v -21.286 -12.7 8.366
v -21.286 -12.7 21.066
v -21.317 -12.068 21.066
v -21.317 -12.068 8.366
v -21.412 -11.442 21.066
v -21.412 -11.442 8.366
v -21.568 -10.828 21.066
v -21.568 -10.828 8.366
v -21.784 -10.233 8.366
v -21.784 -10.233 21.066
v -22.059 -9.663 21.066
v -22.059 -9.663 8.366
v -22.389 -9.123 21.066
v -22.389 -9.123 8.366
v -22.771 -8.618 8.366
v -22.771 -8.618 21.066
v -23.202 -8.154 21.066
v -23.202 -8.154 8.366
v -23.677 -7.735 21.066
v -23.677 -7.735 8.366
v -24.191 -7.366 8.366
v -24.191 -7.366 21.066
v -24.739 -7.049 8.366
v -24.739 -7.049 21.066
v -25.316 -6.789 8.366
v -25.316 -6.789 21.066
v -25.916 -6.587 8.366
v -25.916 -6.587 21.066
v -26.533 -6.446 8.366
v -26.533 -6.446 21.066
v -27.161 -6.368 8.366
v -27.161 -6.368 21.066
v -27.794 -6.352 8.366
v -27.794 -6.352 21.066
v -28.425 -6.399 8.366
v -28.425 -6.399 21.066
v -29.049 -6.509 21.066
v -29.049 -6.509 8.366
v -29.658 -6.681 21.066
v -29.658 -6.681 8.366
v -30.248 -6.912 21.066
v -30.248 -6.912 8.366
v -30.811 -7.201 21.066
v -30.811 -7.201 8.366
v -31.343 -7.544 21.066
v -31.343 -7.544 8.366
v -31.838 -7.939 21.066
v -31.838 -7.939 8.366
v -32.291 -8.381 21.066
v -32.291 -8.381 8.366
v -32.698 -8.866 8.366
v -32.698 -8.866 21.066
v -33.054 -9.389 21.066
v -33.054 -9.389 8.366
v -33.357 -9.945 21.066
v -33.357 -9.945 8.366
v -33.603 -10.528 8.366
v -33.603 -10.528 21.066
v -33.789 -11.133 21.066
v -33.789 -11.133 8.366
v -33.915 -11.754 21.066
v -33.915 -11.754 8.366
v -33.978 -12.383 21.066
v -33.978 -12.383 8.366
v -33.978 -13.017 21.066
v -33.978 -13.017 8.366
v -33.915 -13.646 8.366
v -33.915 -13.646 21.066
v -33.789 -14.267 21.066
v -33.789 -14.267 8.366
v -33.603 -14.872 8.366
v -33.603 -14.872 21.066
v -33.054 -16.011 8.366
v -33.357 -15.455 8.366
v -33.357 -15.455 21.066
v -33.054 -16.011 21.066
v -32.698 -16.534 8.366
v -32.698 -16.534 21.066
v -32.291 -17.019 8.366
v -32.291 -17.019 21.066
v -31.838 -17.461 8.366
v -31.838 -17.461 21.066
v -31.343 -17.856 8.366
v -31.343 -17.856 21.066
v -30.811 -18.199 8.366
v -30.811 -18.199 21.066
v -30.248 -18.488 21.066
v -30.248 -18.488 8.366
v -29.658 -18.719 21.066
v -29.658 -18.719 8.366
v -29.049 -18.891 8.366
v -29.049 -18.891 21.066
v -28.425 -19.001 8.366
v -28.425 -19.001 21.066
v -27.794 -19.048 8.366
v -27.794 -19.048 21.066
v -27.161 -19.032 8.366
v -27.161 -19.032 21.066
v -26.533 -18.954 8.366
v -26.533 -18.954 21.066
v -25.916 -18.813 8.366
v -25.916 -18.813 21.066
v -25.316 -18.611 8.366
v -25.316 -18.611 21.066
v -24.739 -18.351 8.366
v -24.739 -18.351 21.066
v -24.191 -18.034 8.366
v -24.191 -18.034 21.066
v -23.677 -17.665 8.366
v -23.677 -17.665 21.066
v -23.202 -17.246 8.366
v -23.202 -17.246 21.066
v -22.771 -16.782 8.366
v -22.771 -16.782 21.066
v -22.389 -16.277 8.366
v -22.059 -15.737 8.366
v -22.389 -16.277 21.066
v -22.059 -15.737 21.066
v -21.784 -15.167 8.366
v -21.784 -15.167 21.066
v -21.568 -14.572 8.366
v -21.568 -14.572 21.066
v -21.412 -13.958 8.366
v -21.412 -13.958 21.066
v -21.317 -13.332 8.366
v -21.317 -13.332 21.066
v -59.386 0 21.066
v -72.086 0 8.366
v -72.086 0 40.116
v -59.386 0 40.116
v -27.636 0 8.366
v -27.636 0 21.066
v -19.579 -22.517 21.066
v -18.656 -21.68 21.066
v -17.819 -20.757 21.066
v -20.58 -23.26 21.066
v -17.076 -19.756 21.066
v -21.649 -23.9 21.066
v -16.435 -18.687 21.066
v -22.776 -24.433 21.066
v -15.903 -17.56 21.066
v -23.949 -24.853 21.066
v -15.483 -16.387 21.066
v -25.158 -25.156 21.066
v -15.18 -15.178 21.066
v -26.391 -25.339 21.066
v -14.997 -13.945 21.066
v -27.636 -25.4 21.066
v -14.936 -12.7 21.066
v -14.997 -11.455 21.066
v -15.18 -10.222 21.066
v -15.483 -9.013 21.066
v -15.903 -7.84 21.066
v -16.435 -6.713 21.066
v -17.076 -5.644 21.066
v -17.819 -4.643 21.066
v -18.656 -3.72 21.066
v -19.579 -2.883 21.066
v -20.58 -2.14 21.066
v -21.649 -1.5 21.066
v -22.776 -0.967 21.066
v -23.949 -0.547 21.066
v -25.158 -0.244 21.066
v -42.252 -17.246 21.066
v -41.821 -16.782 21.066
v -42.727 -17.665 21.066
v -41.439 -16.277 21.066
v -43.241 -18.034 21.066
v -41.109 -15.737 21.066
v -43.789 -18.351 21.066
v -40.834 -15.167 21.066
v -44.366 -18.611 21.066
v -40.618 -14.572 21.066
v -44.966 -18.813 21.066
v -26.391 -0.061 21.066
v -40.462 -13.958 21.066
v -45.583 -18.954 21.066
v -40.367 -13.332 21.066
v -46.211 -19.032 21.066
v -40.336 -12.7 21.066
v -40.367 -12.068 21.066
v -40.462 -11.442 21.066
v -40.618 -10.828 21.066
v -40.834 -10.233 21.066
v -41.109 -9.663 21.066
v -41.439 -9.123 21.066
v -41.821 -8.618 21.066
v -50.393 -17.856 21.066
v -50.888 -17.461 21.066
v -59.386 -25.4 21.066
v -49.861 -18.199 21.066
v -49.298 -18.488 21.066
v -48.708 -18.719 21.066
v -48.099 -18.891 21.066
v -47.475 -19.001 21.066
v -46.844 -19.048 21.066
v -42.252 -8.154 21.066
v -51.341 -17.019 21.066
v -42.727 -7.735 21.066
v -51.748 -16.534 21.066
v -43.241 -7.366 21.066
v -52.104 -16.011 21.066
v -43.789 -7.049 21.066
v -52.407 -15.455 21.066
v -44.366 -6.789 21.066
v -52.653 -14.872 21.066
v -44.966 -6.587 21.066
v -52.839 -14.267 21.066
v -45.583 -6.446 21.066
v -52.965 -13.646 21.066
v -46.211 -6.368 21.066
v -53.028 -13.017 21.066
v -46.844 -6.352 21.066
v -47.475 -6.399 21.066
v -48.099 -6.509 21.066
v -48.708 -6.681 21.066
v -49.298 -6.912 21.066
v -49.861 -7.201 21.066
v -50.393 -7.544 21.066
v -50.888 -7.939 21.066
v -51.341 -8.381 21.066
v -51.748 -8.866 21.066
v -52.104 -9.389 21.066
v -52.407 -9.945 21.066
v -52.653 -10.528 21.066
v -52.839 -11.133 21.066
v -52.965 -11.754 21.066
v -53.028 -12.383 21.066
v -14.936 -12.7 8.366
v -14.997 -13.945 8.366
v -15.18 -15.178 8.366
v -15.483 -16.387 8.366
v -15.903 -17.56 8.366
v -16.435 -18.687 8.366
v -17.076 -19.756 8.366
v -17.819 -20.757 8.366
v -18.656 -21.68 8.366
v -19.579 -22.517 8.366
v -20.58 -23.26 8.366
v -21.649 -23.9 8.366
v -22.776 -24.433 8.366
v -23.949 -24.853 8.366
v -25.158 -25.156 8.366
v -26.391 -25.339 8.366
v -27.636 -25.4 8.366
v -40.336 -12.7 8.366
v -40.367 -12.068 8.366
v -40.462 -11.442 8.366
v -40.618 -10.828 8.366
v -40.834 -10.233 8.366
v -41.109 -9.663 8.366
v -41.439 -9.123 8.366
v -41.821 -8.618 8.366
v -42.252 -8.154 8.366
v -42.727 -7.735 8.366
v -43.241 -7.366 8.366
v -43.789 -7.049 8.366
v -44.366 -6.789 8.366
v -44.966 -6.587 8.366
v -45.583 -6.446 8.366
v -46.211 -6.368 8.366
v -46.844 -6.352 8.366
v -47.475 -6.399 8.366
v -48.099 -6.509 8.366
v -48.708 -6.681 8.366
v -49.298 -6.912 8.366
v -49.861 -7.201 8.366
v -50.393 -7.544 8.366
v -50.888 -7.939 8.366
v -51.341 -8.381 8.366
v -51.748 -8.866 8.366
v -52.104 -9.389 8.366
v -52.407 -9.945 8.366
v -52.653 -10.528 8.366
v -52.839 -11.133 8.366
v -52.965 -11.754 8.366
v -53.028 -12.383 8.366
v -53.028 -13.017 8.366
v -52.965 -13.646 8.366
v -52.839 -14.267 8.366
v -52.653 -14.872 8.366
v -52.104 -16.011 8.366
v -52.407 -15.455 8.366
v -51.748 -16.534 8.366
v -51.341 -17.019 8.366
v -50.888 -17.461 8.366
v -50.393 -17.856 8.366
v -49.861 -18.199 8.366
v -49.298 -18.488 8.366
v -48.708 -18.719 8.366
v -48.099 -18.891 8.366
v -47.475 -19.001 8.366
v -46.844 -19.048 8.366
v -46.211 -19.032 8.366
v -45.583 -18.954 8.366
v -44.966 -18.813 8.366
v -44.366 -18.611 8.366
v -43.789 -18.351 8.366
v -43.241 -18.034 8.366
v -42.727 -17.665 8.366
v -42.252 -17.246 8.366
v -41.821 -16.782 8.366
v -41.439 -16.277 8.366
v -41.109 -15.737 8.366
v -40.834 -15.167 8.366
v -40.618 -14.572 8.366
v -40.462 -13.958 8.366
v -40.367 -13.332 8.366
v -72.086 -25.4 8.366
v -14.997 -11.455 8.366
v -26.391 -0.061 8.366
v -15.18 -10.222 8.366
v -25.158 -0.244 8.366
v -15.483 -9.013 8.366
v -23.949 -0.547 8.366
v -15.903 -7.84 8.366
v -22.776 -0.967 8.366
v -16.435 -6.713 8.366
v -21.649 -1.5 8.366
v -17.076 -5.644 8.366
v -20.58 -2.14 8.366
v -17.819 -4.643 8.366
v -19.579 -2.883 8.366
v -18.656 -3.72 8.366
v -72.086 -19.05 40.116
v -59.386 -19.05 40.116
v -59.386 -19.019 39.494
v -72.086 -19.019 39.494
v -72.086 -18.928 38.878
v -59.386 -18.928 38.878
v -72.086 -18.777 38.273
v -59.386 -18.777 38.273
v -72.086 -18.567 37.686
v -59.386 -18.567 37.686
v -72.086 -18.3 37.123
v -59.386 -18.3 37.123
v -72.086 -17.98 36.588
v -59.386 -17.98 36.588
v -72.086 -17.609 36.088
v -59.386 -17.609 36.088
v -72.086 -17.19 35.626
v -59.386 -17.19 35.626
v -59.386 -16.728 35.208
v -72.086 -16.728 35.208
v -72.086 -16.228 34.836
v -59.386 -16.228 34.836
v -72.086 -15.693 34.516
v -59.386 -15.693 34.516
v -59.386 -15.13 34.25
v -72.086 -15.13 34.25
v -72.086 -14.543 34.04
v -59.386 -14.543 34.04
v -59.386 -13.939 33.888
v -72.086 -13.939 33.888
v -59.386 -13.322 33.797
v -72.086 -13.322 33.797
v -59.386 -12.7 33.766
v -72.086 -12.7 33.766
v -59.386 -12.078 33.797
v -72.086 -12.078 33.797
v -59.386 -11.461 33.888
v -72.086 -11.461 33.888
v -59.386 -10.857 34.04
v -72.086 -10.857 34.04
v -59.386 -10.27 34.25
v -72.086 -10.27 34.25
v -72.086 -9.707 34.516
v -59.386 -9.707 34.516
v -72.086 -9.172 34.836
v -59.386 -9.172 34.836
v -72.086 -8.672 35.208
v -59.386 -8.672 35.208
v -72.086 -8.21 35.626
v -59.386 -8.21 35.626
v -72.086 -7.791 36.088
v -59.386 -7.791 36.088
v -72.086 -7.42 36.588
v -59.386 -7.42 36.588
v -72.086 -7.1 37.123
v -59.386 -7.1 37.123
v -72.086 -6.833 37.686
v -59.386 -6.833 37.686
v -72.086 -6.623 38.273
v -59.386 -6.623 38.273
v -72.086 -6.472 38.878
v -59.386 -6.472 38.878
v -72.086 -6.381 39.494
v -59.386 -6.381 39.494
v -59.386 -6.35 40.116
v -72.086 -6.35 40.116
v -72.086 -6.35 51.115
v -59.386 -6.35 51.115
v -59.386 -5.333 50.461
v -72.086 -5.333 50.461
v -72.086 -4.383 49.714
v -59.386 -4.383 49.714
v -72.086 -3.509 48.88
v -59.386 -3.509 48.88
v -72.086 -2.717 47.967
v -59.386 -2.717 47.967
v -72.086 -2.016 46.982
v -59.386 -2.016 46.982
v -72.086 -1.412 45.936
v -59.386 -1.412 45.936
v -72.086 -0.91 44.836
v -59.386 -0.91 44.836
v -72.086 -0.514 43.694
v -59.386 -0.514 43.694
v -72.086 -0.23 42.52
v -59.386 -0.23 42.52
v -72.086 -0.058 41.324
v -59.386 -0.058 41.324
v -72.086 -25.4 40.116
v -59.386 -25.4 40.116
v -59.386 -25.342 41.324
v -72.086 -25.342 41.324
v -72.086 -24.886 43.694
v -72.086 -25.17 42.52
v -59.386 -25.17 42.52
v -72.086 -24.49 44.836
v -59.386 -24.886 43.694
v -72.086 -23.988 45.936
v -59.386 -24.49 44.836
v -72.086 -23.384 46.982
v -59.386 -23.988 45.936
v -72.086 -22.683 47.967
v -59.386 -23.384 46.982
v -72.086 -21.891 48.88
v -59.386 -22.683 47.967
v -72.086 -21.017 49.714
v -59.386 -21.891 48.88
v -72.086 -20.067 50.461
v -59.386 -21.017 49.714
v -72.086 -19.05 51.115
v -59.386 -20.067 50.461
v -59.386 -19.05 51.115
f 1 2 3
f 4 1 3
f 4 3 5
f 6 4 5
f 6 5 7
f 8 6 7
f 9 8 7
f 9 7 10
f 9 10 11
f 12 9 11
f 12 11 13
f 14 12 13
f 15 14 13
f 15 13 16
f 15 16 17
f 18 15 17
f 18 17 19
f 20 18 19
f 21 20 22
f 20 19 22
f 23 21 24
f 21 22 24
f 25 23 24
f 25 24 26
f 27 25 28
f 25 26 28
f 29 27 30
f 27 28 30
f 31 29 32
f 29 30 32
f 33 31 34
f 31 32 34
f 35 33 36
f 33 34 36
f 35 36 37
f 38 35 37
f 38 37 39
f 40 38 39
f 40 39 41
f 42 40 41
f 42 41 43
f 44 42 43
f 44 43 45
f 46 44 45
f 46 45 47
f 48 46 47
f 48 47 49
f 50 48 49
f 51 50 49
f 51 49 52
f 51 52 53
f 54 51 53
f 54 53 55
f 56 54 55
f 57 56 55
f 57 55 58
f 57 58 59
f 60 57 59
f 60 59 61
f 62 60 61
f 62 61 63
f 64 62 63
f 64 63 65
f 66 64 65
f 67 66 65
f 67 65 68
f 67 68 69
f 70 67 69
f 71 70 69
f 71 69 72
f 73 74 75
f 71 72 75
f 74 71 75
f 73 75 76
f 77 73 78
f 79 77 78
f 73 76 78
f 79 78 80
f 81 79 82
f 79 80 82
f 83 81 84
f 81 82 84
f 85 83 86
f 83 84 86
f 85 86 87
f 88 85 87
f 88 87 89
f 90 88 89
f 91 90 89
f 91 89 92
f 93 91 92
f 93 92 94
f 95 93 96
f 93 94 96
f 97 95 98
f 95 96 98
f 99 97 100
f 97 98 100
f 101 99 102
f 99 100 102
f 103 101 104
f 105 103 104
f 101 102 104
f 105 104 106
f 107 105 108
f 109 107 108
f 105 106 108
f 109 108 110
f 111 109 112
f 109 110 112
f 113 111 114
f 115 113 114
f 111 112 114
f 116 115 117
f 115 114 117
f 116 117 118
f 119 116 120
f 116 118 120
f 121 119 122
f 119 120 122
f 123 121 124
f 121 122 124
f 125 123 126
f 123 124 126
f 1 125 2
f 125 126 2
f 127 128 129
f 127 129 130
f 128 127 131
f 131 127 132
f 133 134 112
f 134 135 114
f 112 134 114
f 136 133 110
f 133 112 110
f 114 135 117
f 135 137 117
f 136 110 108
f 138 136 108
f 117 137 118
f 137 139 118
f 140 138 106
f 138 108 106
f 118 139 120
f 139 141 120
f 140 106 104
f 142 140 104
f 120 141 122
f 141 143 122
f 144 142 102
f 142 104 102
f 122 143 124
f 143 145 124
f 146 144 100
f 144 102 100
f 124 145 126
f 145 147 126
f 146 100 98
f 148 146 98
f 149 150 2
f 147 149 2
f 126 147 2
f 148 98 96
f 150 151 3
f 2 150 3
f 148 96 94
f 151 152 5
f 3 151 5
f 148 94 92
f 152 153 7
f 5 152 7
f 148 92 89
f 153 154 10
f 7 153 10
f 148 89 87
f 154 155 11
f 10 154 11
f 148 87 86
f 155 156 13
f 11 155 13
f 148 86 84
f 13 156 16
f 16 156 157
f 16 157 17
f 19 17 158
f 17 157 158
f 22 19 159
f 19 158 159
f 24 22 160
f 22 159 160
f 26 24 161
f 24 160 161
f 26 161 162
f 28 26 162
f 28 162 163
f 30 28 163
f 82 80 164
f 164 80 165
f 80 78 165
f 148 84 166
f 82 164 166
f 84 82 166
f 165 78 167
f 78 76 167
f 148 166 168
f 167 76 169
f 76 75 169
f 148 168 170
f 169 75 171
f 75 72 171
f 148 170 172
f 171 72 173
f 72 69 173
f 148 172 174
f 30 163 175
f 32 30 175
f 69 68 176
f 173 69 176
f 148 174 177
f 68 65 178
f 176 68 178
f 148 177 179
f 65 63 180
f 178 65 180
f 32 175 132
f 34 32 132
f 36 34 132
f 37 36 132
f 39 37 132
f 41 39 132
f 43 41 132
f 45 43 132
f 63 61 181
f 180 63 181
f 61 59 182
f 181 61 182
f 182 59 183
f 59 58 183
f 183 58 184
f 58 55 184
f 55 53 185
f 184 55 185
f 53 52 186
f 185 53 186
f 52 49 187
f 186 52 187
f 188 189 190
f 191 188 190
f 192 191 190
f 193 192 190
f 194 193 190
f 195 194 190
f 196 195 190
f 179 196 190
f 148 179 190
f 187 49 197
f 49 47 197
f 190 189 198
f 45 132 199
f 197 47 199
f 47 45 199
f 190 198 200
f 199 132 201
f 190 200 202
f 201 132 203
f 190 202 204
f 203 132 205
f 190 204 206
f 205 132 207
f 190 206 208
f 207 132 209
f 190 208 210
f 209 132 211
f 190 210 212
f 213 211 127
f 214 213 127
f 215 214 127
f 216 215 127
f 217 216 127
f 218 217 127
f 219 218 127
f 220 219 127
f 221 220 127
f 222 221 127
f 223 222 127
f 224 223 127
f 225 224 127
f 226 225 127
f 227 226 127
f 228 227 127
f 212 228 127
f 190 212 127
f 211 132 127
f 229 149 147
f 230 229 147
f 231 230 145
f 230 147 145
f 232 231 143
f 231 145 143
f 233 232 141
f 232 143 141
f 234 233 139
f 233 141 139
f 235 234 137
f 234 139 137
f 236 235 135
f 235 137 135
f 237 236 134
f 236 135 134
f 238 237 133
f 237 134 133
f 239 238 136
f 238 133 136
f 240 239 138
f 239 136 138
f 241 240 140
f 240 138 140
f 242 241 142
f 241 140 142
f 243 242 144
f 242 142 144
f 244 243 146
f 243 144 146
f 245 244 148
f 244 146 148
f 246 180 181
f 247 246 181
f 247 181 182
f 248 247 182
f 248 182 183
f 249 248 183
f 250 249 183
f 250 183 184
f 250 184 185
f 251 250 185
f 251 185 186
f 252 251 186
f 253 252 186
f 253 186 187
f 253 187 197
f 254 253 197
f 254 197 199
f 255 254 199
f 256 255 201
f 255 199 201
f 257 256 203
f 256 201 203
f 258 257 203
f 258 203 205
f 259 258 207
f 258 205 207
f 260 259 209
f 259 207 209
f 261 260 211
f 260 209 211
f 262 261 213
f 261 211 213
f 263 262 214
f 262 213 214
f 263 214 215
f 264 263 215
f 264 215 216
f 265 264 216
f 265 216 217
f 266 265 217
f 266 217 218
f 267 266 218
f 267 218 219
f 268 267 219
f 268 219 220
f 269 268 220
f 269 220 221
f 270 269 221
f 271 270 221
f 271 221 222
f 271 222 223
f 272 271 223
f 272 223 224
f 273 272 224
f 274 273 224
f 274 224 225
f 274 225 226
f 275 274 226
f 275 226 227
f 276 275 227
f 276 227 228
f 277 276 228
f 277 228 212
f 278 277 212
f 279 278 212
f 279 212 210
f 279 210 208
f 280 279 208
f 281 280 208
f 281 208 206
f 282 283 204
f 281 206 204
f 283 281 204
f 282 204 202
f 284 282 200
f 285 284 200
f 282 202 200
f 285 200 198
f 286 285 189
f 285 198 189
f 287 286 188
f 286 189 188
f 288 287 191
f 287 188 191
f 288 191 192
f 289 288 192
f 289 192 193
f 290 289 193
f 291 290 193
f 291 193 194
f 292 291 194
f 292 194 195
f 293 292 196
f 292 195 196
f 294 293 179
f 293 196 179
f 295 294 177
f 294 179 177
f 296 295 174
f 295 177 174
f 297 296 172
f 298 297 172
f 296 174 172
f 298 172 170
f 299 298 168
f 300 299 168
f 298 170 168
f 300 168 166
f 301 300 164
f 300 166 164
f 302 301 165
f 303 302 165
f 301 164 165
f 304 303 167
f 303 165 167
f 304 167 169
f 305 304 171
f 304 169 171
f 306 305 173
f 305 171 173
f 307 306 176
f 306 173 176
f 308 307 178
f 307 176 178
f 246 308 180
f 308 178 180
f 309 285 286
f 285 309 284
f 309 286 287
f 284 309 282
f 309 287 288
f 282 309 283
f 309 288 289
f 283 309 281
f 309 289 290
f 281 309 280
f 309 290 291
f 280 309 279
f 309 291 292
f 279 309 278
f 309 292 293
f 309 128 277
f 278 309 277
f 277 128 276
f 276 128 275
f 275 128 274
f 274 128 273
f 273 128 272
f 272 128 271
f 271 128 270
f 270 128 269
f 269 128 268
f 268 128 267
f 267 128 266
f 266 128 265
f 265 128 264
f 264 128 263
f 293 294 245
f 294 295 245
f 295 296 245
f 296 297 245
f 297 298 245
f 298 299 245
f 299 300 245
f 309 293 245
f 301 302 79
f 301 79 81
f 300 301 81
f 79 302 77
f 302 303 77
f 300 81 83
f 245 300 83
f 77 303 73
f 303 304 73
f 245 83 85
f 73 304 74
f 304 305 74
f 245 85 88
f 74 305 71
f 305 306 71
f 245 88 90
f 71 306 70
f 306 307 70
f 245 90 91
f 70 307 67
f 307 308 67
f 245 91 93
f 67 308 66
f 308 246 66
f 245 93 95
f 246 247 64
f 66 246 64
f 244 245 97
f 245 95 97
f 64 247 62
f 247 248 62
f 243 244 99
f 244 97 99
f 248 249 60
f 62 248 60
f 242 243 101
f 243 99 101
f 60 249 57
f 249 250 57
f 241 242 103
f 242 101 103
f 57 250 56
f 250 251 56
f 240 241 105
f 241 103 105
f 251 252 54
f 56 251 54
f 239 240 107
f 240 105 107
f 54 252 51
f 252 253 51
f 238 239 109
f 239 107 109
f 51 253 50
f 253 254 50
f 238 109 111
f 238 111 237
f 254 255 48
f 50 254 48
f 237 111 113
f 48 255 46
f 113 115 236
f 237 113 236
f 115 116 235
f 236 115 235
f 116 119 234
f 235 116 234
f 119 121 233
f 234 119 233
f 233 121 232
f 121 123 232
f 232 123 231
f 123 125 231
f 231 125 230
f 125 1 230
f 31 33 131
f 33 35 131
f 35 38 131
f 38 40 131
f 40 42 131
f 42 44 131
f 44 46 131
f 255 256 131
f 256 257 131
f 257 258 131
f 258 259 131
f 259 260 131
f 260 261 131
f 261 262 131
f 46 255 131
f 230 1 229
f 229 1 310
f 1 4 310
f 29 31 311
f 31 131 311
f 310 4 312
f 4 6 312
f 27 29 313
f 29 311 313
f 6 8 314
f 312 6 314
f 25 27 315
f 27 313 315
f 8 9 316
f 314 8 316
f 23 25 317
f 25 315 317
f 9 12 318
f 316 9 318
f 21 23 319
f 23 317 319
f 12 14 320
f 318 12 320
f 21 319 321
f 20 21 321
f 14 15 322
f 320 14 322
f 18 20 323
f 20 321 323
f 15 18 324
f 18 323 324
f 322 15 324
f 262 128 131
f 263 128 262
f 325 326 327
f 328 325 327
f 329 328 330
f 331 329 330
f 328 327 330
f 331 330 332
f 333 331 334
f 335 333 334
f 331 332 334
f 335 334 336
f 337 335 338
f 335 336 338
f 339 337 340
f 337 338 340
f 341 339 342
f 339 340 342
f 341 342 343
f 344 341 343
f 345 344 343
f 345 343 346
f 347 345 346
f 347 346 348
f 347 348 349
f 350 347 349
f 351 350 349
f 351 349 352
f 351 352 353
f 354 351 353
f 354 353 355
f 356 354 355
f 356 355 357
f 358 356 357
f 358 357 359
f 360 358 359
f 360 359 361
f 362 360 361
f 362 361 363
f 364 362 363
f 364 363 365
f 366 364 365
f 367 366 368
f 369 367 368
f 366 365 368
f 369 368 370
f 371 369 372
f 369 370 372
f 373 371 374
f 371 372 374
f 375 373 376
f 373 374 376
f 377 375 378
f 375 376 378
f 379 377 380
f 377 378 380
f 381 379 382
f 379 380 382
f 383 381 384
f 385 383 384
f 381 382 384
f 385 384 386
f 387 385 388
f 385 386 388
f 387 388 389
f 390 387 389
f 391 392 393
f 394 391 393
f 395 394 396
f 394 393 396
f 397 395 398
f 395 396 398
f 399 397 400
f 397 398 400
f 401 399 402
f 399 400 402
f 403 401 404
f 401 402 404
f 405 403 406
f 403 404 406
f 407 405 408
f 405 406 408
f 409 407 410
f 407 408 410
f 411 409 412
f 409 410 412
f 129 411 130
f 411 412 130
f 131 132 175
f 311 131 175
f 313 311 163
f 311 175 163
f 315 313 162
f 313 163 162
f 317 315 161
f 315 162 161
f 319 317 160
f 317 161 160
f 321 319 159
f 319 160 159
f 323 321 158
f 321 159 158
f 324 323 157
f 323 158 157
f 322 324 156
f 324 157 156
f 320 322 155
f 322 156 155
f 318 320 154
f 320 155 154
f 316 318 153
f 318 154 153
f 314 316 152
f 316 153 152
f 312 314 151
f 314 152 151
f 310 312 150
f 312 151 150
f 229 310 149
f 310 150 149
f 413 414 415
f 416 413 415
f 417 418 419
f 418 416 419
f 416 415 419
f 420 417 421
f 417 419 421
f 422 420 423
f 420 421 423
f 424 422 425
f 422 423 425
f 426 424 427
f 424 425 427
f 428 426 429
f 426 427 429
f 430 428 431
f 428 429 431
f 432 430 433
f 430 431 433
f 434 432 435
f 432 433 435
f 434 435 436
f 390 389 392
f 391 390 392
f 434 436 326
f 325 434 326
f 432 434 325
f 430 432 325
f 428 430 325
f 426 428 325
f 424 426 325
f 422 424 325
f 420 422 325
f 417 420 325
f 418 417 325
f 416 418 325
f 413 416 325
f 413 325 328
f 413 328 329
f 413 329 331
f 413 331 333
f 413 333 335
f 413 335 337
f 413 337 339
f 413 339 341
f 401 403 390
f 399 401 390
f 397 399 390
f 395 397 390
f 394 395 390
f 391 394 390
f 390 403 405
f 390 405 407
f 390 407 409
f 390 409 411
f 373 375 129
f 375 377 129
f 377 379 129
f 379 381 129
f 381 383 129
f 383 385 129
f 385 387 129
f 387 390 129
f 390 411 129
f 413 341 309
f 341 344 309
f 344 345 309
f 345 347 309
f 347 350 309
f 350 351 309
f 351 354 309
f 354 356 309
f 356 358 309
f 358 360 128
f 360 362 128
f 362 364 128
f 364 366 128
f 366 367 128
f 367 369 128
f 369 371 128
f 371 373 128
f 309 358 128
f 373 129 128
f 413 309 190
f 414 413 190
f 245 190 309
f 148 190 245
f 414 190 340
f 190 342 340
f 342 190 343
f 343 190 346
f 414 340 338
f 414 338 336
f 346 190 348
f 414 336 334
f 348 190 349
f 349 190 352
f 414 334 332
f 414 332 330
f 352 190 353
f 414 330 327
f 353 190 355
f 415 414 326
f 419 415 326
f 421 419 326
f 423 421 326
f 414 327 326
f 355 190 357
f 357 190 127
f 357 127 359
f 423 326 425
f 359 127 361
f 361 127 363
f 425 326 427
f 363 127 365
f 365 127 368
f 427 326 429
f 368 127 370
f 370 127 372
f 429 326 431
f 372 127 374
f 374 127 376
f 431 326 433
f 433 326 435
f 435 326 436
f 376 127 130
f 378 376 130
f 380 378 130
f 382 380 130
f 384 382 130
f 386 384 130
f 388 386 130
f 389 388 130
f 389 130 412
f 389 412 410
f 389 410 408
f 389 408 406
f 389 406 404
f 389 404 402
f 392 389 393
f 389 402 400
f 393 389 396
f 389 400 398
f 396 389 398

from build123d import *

# Parameters (mm, degrees)
F1_DEPTH = 25.4
F2_R     = 6.35
F3_DEPTH = 12.701
F5_DEPTH = 12.701
F7_DEPTH = 12.701
F9_DEPTH = 12.701


with BuildPart() as f1:
    # F0 (on Front) → F1 (new body)
    with BuildSketch(Plane.XZ):
        Polygon((-72.08584, 8.36633), (-14.93584, 8.36633), (-14.93584, 21.06633), (-59.38584, 21.06633), (-59.38584, 52.81633), (-72.08584, 52.81633), align=None)
    extrude(amount=F1_DEPTH)

    # F2 (on face) → F3 (cut, through all)
    with BuildSketch(Plane.XY.offset(21.06633)):
        with Locations((-46.68584, -12.7)):
            Circle(F2_R)
        with Locations((-27.63584, -12.7)):
            Circle(F2_R)
    extrude(amount=-F3_DEPTH, mode=Mode.SUBTRACT)

    # F4 (on face) → F5 (cut, through all)
    with BuildSketch(Plane.XY.offset(21.06633)):
        with BuildLine():
            ThreePointArc((-27.63584, 0), (-18.655584, -3.719744), (-14.93584, -12.7))
            Line((-14.93584, -12.7), (-14.93584, 0))
            Line((-14.93584, 0), (-27.63584, 0))
        make_face()
        with BuildLine():
            ThreePointArc((-14.93584, -12.7), (-18.655584, -21.680256), (-27.63584, -25.4))
            Line((-27.63584, -25.4), (-14.93584, -25.4))
            Line((-14.93584, -25.4), (-14.93584, -12.7))
        make_face()
    extrude(amount=-F5_DEPTH, mode=Mode.SUBTRACT)

    # F6 (on face) → F7 (cut, through all)
    with BuildSketch(Plane.YZ.offset(-59.38584)):
        with BuildLine():
            ThreePointArc((-25.4, 40.11633), (-21.680256, 49.096586), (-12.7, 52.81633))
            Line((-12.7, 52.81633), (-25.4, 52.81633))
            Line((-25.4, 52.81633), (-25.4, 40.11633))
        make_face()
        with BuildLine():
            ThreePointArc((-12.7, 52.81633), (-3.719744, 49.096586), (0, 40.11633))
            Line((0, 40.11633), (0, 52.81633))
            Line((0, 52.81633), (-12.7, 52.81633))
        make_face()
    extrude(amount=-F7_DEPTH, mode=Mode.SUBTRACT)

    # F8 (on face) → F9 (cut, through all)
    with BuildSketch(Plane.YZ.offset(-59.38584)):
        with BuildLine():
            ThreePointArc((-19.05, 40.11633), (-12.7, 33.76633), (-6.35, 40.11633))
            Line((-6.35, 40.11633), (-12.7, 40.11633))
            Line((-12.7, 40.11633), (-19.05, 40.11633))
        make_face()
        with BuildLine():
            ThreePointArc((-19.05, 40.11633), (-12.7, 46.46633), (-6.35, 40.11633))
            Line((-6.35, 40.11633), (-6.35, 51.114853))
            ThreePointArc((-6.35, 51.114853), (-12.7, 52.81633), (-19.05, 51.114853))
            Line((-19.05, 51.114853), (-19.05, 40.11633))
        make_face()
        with BuildLine():
            Line((-12.7, 40.11633), (-6.35, 40.11633))
            ThreePointArc((-6.35, 40.11633), (-12.7, 46.46633), (-19.05, 40.11633))
            Line((-19.05, 40.11633), (-12.7, 40.11633))
        make_face()
    extrude(amount=-F9_DEPTH, mode=Mode.SUBTRACT)


solid = f1.part
